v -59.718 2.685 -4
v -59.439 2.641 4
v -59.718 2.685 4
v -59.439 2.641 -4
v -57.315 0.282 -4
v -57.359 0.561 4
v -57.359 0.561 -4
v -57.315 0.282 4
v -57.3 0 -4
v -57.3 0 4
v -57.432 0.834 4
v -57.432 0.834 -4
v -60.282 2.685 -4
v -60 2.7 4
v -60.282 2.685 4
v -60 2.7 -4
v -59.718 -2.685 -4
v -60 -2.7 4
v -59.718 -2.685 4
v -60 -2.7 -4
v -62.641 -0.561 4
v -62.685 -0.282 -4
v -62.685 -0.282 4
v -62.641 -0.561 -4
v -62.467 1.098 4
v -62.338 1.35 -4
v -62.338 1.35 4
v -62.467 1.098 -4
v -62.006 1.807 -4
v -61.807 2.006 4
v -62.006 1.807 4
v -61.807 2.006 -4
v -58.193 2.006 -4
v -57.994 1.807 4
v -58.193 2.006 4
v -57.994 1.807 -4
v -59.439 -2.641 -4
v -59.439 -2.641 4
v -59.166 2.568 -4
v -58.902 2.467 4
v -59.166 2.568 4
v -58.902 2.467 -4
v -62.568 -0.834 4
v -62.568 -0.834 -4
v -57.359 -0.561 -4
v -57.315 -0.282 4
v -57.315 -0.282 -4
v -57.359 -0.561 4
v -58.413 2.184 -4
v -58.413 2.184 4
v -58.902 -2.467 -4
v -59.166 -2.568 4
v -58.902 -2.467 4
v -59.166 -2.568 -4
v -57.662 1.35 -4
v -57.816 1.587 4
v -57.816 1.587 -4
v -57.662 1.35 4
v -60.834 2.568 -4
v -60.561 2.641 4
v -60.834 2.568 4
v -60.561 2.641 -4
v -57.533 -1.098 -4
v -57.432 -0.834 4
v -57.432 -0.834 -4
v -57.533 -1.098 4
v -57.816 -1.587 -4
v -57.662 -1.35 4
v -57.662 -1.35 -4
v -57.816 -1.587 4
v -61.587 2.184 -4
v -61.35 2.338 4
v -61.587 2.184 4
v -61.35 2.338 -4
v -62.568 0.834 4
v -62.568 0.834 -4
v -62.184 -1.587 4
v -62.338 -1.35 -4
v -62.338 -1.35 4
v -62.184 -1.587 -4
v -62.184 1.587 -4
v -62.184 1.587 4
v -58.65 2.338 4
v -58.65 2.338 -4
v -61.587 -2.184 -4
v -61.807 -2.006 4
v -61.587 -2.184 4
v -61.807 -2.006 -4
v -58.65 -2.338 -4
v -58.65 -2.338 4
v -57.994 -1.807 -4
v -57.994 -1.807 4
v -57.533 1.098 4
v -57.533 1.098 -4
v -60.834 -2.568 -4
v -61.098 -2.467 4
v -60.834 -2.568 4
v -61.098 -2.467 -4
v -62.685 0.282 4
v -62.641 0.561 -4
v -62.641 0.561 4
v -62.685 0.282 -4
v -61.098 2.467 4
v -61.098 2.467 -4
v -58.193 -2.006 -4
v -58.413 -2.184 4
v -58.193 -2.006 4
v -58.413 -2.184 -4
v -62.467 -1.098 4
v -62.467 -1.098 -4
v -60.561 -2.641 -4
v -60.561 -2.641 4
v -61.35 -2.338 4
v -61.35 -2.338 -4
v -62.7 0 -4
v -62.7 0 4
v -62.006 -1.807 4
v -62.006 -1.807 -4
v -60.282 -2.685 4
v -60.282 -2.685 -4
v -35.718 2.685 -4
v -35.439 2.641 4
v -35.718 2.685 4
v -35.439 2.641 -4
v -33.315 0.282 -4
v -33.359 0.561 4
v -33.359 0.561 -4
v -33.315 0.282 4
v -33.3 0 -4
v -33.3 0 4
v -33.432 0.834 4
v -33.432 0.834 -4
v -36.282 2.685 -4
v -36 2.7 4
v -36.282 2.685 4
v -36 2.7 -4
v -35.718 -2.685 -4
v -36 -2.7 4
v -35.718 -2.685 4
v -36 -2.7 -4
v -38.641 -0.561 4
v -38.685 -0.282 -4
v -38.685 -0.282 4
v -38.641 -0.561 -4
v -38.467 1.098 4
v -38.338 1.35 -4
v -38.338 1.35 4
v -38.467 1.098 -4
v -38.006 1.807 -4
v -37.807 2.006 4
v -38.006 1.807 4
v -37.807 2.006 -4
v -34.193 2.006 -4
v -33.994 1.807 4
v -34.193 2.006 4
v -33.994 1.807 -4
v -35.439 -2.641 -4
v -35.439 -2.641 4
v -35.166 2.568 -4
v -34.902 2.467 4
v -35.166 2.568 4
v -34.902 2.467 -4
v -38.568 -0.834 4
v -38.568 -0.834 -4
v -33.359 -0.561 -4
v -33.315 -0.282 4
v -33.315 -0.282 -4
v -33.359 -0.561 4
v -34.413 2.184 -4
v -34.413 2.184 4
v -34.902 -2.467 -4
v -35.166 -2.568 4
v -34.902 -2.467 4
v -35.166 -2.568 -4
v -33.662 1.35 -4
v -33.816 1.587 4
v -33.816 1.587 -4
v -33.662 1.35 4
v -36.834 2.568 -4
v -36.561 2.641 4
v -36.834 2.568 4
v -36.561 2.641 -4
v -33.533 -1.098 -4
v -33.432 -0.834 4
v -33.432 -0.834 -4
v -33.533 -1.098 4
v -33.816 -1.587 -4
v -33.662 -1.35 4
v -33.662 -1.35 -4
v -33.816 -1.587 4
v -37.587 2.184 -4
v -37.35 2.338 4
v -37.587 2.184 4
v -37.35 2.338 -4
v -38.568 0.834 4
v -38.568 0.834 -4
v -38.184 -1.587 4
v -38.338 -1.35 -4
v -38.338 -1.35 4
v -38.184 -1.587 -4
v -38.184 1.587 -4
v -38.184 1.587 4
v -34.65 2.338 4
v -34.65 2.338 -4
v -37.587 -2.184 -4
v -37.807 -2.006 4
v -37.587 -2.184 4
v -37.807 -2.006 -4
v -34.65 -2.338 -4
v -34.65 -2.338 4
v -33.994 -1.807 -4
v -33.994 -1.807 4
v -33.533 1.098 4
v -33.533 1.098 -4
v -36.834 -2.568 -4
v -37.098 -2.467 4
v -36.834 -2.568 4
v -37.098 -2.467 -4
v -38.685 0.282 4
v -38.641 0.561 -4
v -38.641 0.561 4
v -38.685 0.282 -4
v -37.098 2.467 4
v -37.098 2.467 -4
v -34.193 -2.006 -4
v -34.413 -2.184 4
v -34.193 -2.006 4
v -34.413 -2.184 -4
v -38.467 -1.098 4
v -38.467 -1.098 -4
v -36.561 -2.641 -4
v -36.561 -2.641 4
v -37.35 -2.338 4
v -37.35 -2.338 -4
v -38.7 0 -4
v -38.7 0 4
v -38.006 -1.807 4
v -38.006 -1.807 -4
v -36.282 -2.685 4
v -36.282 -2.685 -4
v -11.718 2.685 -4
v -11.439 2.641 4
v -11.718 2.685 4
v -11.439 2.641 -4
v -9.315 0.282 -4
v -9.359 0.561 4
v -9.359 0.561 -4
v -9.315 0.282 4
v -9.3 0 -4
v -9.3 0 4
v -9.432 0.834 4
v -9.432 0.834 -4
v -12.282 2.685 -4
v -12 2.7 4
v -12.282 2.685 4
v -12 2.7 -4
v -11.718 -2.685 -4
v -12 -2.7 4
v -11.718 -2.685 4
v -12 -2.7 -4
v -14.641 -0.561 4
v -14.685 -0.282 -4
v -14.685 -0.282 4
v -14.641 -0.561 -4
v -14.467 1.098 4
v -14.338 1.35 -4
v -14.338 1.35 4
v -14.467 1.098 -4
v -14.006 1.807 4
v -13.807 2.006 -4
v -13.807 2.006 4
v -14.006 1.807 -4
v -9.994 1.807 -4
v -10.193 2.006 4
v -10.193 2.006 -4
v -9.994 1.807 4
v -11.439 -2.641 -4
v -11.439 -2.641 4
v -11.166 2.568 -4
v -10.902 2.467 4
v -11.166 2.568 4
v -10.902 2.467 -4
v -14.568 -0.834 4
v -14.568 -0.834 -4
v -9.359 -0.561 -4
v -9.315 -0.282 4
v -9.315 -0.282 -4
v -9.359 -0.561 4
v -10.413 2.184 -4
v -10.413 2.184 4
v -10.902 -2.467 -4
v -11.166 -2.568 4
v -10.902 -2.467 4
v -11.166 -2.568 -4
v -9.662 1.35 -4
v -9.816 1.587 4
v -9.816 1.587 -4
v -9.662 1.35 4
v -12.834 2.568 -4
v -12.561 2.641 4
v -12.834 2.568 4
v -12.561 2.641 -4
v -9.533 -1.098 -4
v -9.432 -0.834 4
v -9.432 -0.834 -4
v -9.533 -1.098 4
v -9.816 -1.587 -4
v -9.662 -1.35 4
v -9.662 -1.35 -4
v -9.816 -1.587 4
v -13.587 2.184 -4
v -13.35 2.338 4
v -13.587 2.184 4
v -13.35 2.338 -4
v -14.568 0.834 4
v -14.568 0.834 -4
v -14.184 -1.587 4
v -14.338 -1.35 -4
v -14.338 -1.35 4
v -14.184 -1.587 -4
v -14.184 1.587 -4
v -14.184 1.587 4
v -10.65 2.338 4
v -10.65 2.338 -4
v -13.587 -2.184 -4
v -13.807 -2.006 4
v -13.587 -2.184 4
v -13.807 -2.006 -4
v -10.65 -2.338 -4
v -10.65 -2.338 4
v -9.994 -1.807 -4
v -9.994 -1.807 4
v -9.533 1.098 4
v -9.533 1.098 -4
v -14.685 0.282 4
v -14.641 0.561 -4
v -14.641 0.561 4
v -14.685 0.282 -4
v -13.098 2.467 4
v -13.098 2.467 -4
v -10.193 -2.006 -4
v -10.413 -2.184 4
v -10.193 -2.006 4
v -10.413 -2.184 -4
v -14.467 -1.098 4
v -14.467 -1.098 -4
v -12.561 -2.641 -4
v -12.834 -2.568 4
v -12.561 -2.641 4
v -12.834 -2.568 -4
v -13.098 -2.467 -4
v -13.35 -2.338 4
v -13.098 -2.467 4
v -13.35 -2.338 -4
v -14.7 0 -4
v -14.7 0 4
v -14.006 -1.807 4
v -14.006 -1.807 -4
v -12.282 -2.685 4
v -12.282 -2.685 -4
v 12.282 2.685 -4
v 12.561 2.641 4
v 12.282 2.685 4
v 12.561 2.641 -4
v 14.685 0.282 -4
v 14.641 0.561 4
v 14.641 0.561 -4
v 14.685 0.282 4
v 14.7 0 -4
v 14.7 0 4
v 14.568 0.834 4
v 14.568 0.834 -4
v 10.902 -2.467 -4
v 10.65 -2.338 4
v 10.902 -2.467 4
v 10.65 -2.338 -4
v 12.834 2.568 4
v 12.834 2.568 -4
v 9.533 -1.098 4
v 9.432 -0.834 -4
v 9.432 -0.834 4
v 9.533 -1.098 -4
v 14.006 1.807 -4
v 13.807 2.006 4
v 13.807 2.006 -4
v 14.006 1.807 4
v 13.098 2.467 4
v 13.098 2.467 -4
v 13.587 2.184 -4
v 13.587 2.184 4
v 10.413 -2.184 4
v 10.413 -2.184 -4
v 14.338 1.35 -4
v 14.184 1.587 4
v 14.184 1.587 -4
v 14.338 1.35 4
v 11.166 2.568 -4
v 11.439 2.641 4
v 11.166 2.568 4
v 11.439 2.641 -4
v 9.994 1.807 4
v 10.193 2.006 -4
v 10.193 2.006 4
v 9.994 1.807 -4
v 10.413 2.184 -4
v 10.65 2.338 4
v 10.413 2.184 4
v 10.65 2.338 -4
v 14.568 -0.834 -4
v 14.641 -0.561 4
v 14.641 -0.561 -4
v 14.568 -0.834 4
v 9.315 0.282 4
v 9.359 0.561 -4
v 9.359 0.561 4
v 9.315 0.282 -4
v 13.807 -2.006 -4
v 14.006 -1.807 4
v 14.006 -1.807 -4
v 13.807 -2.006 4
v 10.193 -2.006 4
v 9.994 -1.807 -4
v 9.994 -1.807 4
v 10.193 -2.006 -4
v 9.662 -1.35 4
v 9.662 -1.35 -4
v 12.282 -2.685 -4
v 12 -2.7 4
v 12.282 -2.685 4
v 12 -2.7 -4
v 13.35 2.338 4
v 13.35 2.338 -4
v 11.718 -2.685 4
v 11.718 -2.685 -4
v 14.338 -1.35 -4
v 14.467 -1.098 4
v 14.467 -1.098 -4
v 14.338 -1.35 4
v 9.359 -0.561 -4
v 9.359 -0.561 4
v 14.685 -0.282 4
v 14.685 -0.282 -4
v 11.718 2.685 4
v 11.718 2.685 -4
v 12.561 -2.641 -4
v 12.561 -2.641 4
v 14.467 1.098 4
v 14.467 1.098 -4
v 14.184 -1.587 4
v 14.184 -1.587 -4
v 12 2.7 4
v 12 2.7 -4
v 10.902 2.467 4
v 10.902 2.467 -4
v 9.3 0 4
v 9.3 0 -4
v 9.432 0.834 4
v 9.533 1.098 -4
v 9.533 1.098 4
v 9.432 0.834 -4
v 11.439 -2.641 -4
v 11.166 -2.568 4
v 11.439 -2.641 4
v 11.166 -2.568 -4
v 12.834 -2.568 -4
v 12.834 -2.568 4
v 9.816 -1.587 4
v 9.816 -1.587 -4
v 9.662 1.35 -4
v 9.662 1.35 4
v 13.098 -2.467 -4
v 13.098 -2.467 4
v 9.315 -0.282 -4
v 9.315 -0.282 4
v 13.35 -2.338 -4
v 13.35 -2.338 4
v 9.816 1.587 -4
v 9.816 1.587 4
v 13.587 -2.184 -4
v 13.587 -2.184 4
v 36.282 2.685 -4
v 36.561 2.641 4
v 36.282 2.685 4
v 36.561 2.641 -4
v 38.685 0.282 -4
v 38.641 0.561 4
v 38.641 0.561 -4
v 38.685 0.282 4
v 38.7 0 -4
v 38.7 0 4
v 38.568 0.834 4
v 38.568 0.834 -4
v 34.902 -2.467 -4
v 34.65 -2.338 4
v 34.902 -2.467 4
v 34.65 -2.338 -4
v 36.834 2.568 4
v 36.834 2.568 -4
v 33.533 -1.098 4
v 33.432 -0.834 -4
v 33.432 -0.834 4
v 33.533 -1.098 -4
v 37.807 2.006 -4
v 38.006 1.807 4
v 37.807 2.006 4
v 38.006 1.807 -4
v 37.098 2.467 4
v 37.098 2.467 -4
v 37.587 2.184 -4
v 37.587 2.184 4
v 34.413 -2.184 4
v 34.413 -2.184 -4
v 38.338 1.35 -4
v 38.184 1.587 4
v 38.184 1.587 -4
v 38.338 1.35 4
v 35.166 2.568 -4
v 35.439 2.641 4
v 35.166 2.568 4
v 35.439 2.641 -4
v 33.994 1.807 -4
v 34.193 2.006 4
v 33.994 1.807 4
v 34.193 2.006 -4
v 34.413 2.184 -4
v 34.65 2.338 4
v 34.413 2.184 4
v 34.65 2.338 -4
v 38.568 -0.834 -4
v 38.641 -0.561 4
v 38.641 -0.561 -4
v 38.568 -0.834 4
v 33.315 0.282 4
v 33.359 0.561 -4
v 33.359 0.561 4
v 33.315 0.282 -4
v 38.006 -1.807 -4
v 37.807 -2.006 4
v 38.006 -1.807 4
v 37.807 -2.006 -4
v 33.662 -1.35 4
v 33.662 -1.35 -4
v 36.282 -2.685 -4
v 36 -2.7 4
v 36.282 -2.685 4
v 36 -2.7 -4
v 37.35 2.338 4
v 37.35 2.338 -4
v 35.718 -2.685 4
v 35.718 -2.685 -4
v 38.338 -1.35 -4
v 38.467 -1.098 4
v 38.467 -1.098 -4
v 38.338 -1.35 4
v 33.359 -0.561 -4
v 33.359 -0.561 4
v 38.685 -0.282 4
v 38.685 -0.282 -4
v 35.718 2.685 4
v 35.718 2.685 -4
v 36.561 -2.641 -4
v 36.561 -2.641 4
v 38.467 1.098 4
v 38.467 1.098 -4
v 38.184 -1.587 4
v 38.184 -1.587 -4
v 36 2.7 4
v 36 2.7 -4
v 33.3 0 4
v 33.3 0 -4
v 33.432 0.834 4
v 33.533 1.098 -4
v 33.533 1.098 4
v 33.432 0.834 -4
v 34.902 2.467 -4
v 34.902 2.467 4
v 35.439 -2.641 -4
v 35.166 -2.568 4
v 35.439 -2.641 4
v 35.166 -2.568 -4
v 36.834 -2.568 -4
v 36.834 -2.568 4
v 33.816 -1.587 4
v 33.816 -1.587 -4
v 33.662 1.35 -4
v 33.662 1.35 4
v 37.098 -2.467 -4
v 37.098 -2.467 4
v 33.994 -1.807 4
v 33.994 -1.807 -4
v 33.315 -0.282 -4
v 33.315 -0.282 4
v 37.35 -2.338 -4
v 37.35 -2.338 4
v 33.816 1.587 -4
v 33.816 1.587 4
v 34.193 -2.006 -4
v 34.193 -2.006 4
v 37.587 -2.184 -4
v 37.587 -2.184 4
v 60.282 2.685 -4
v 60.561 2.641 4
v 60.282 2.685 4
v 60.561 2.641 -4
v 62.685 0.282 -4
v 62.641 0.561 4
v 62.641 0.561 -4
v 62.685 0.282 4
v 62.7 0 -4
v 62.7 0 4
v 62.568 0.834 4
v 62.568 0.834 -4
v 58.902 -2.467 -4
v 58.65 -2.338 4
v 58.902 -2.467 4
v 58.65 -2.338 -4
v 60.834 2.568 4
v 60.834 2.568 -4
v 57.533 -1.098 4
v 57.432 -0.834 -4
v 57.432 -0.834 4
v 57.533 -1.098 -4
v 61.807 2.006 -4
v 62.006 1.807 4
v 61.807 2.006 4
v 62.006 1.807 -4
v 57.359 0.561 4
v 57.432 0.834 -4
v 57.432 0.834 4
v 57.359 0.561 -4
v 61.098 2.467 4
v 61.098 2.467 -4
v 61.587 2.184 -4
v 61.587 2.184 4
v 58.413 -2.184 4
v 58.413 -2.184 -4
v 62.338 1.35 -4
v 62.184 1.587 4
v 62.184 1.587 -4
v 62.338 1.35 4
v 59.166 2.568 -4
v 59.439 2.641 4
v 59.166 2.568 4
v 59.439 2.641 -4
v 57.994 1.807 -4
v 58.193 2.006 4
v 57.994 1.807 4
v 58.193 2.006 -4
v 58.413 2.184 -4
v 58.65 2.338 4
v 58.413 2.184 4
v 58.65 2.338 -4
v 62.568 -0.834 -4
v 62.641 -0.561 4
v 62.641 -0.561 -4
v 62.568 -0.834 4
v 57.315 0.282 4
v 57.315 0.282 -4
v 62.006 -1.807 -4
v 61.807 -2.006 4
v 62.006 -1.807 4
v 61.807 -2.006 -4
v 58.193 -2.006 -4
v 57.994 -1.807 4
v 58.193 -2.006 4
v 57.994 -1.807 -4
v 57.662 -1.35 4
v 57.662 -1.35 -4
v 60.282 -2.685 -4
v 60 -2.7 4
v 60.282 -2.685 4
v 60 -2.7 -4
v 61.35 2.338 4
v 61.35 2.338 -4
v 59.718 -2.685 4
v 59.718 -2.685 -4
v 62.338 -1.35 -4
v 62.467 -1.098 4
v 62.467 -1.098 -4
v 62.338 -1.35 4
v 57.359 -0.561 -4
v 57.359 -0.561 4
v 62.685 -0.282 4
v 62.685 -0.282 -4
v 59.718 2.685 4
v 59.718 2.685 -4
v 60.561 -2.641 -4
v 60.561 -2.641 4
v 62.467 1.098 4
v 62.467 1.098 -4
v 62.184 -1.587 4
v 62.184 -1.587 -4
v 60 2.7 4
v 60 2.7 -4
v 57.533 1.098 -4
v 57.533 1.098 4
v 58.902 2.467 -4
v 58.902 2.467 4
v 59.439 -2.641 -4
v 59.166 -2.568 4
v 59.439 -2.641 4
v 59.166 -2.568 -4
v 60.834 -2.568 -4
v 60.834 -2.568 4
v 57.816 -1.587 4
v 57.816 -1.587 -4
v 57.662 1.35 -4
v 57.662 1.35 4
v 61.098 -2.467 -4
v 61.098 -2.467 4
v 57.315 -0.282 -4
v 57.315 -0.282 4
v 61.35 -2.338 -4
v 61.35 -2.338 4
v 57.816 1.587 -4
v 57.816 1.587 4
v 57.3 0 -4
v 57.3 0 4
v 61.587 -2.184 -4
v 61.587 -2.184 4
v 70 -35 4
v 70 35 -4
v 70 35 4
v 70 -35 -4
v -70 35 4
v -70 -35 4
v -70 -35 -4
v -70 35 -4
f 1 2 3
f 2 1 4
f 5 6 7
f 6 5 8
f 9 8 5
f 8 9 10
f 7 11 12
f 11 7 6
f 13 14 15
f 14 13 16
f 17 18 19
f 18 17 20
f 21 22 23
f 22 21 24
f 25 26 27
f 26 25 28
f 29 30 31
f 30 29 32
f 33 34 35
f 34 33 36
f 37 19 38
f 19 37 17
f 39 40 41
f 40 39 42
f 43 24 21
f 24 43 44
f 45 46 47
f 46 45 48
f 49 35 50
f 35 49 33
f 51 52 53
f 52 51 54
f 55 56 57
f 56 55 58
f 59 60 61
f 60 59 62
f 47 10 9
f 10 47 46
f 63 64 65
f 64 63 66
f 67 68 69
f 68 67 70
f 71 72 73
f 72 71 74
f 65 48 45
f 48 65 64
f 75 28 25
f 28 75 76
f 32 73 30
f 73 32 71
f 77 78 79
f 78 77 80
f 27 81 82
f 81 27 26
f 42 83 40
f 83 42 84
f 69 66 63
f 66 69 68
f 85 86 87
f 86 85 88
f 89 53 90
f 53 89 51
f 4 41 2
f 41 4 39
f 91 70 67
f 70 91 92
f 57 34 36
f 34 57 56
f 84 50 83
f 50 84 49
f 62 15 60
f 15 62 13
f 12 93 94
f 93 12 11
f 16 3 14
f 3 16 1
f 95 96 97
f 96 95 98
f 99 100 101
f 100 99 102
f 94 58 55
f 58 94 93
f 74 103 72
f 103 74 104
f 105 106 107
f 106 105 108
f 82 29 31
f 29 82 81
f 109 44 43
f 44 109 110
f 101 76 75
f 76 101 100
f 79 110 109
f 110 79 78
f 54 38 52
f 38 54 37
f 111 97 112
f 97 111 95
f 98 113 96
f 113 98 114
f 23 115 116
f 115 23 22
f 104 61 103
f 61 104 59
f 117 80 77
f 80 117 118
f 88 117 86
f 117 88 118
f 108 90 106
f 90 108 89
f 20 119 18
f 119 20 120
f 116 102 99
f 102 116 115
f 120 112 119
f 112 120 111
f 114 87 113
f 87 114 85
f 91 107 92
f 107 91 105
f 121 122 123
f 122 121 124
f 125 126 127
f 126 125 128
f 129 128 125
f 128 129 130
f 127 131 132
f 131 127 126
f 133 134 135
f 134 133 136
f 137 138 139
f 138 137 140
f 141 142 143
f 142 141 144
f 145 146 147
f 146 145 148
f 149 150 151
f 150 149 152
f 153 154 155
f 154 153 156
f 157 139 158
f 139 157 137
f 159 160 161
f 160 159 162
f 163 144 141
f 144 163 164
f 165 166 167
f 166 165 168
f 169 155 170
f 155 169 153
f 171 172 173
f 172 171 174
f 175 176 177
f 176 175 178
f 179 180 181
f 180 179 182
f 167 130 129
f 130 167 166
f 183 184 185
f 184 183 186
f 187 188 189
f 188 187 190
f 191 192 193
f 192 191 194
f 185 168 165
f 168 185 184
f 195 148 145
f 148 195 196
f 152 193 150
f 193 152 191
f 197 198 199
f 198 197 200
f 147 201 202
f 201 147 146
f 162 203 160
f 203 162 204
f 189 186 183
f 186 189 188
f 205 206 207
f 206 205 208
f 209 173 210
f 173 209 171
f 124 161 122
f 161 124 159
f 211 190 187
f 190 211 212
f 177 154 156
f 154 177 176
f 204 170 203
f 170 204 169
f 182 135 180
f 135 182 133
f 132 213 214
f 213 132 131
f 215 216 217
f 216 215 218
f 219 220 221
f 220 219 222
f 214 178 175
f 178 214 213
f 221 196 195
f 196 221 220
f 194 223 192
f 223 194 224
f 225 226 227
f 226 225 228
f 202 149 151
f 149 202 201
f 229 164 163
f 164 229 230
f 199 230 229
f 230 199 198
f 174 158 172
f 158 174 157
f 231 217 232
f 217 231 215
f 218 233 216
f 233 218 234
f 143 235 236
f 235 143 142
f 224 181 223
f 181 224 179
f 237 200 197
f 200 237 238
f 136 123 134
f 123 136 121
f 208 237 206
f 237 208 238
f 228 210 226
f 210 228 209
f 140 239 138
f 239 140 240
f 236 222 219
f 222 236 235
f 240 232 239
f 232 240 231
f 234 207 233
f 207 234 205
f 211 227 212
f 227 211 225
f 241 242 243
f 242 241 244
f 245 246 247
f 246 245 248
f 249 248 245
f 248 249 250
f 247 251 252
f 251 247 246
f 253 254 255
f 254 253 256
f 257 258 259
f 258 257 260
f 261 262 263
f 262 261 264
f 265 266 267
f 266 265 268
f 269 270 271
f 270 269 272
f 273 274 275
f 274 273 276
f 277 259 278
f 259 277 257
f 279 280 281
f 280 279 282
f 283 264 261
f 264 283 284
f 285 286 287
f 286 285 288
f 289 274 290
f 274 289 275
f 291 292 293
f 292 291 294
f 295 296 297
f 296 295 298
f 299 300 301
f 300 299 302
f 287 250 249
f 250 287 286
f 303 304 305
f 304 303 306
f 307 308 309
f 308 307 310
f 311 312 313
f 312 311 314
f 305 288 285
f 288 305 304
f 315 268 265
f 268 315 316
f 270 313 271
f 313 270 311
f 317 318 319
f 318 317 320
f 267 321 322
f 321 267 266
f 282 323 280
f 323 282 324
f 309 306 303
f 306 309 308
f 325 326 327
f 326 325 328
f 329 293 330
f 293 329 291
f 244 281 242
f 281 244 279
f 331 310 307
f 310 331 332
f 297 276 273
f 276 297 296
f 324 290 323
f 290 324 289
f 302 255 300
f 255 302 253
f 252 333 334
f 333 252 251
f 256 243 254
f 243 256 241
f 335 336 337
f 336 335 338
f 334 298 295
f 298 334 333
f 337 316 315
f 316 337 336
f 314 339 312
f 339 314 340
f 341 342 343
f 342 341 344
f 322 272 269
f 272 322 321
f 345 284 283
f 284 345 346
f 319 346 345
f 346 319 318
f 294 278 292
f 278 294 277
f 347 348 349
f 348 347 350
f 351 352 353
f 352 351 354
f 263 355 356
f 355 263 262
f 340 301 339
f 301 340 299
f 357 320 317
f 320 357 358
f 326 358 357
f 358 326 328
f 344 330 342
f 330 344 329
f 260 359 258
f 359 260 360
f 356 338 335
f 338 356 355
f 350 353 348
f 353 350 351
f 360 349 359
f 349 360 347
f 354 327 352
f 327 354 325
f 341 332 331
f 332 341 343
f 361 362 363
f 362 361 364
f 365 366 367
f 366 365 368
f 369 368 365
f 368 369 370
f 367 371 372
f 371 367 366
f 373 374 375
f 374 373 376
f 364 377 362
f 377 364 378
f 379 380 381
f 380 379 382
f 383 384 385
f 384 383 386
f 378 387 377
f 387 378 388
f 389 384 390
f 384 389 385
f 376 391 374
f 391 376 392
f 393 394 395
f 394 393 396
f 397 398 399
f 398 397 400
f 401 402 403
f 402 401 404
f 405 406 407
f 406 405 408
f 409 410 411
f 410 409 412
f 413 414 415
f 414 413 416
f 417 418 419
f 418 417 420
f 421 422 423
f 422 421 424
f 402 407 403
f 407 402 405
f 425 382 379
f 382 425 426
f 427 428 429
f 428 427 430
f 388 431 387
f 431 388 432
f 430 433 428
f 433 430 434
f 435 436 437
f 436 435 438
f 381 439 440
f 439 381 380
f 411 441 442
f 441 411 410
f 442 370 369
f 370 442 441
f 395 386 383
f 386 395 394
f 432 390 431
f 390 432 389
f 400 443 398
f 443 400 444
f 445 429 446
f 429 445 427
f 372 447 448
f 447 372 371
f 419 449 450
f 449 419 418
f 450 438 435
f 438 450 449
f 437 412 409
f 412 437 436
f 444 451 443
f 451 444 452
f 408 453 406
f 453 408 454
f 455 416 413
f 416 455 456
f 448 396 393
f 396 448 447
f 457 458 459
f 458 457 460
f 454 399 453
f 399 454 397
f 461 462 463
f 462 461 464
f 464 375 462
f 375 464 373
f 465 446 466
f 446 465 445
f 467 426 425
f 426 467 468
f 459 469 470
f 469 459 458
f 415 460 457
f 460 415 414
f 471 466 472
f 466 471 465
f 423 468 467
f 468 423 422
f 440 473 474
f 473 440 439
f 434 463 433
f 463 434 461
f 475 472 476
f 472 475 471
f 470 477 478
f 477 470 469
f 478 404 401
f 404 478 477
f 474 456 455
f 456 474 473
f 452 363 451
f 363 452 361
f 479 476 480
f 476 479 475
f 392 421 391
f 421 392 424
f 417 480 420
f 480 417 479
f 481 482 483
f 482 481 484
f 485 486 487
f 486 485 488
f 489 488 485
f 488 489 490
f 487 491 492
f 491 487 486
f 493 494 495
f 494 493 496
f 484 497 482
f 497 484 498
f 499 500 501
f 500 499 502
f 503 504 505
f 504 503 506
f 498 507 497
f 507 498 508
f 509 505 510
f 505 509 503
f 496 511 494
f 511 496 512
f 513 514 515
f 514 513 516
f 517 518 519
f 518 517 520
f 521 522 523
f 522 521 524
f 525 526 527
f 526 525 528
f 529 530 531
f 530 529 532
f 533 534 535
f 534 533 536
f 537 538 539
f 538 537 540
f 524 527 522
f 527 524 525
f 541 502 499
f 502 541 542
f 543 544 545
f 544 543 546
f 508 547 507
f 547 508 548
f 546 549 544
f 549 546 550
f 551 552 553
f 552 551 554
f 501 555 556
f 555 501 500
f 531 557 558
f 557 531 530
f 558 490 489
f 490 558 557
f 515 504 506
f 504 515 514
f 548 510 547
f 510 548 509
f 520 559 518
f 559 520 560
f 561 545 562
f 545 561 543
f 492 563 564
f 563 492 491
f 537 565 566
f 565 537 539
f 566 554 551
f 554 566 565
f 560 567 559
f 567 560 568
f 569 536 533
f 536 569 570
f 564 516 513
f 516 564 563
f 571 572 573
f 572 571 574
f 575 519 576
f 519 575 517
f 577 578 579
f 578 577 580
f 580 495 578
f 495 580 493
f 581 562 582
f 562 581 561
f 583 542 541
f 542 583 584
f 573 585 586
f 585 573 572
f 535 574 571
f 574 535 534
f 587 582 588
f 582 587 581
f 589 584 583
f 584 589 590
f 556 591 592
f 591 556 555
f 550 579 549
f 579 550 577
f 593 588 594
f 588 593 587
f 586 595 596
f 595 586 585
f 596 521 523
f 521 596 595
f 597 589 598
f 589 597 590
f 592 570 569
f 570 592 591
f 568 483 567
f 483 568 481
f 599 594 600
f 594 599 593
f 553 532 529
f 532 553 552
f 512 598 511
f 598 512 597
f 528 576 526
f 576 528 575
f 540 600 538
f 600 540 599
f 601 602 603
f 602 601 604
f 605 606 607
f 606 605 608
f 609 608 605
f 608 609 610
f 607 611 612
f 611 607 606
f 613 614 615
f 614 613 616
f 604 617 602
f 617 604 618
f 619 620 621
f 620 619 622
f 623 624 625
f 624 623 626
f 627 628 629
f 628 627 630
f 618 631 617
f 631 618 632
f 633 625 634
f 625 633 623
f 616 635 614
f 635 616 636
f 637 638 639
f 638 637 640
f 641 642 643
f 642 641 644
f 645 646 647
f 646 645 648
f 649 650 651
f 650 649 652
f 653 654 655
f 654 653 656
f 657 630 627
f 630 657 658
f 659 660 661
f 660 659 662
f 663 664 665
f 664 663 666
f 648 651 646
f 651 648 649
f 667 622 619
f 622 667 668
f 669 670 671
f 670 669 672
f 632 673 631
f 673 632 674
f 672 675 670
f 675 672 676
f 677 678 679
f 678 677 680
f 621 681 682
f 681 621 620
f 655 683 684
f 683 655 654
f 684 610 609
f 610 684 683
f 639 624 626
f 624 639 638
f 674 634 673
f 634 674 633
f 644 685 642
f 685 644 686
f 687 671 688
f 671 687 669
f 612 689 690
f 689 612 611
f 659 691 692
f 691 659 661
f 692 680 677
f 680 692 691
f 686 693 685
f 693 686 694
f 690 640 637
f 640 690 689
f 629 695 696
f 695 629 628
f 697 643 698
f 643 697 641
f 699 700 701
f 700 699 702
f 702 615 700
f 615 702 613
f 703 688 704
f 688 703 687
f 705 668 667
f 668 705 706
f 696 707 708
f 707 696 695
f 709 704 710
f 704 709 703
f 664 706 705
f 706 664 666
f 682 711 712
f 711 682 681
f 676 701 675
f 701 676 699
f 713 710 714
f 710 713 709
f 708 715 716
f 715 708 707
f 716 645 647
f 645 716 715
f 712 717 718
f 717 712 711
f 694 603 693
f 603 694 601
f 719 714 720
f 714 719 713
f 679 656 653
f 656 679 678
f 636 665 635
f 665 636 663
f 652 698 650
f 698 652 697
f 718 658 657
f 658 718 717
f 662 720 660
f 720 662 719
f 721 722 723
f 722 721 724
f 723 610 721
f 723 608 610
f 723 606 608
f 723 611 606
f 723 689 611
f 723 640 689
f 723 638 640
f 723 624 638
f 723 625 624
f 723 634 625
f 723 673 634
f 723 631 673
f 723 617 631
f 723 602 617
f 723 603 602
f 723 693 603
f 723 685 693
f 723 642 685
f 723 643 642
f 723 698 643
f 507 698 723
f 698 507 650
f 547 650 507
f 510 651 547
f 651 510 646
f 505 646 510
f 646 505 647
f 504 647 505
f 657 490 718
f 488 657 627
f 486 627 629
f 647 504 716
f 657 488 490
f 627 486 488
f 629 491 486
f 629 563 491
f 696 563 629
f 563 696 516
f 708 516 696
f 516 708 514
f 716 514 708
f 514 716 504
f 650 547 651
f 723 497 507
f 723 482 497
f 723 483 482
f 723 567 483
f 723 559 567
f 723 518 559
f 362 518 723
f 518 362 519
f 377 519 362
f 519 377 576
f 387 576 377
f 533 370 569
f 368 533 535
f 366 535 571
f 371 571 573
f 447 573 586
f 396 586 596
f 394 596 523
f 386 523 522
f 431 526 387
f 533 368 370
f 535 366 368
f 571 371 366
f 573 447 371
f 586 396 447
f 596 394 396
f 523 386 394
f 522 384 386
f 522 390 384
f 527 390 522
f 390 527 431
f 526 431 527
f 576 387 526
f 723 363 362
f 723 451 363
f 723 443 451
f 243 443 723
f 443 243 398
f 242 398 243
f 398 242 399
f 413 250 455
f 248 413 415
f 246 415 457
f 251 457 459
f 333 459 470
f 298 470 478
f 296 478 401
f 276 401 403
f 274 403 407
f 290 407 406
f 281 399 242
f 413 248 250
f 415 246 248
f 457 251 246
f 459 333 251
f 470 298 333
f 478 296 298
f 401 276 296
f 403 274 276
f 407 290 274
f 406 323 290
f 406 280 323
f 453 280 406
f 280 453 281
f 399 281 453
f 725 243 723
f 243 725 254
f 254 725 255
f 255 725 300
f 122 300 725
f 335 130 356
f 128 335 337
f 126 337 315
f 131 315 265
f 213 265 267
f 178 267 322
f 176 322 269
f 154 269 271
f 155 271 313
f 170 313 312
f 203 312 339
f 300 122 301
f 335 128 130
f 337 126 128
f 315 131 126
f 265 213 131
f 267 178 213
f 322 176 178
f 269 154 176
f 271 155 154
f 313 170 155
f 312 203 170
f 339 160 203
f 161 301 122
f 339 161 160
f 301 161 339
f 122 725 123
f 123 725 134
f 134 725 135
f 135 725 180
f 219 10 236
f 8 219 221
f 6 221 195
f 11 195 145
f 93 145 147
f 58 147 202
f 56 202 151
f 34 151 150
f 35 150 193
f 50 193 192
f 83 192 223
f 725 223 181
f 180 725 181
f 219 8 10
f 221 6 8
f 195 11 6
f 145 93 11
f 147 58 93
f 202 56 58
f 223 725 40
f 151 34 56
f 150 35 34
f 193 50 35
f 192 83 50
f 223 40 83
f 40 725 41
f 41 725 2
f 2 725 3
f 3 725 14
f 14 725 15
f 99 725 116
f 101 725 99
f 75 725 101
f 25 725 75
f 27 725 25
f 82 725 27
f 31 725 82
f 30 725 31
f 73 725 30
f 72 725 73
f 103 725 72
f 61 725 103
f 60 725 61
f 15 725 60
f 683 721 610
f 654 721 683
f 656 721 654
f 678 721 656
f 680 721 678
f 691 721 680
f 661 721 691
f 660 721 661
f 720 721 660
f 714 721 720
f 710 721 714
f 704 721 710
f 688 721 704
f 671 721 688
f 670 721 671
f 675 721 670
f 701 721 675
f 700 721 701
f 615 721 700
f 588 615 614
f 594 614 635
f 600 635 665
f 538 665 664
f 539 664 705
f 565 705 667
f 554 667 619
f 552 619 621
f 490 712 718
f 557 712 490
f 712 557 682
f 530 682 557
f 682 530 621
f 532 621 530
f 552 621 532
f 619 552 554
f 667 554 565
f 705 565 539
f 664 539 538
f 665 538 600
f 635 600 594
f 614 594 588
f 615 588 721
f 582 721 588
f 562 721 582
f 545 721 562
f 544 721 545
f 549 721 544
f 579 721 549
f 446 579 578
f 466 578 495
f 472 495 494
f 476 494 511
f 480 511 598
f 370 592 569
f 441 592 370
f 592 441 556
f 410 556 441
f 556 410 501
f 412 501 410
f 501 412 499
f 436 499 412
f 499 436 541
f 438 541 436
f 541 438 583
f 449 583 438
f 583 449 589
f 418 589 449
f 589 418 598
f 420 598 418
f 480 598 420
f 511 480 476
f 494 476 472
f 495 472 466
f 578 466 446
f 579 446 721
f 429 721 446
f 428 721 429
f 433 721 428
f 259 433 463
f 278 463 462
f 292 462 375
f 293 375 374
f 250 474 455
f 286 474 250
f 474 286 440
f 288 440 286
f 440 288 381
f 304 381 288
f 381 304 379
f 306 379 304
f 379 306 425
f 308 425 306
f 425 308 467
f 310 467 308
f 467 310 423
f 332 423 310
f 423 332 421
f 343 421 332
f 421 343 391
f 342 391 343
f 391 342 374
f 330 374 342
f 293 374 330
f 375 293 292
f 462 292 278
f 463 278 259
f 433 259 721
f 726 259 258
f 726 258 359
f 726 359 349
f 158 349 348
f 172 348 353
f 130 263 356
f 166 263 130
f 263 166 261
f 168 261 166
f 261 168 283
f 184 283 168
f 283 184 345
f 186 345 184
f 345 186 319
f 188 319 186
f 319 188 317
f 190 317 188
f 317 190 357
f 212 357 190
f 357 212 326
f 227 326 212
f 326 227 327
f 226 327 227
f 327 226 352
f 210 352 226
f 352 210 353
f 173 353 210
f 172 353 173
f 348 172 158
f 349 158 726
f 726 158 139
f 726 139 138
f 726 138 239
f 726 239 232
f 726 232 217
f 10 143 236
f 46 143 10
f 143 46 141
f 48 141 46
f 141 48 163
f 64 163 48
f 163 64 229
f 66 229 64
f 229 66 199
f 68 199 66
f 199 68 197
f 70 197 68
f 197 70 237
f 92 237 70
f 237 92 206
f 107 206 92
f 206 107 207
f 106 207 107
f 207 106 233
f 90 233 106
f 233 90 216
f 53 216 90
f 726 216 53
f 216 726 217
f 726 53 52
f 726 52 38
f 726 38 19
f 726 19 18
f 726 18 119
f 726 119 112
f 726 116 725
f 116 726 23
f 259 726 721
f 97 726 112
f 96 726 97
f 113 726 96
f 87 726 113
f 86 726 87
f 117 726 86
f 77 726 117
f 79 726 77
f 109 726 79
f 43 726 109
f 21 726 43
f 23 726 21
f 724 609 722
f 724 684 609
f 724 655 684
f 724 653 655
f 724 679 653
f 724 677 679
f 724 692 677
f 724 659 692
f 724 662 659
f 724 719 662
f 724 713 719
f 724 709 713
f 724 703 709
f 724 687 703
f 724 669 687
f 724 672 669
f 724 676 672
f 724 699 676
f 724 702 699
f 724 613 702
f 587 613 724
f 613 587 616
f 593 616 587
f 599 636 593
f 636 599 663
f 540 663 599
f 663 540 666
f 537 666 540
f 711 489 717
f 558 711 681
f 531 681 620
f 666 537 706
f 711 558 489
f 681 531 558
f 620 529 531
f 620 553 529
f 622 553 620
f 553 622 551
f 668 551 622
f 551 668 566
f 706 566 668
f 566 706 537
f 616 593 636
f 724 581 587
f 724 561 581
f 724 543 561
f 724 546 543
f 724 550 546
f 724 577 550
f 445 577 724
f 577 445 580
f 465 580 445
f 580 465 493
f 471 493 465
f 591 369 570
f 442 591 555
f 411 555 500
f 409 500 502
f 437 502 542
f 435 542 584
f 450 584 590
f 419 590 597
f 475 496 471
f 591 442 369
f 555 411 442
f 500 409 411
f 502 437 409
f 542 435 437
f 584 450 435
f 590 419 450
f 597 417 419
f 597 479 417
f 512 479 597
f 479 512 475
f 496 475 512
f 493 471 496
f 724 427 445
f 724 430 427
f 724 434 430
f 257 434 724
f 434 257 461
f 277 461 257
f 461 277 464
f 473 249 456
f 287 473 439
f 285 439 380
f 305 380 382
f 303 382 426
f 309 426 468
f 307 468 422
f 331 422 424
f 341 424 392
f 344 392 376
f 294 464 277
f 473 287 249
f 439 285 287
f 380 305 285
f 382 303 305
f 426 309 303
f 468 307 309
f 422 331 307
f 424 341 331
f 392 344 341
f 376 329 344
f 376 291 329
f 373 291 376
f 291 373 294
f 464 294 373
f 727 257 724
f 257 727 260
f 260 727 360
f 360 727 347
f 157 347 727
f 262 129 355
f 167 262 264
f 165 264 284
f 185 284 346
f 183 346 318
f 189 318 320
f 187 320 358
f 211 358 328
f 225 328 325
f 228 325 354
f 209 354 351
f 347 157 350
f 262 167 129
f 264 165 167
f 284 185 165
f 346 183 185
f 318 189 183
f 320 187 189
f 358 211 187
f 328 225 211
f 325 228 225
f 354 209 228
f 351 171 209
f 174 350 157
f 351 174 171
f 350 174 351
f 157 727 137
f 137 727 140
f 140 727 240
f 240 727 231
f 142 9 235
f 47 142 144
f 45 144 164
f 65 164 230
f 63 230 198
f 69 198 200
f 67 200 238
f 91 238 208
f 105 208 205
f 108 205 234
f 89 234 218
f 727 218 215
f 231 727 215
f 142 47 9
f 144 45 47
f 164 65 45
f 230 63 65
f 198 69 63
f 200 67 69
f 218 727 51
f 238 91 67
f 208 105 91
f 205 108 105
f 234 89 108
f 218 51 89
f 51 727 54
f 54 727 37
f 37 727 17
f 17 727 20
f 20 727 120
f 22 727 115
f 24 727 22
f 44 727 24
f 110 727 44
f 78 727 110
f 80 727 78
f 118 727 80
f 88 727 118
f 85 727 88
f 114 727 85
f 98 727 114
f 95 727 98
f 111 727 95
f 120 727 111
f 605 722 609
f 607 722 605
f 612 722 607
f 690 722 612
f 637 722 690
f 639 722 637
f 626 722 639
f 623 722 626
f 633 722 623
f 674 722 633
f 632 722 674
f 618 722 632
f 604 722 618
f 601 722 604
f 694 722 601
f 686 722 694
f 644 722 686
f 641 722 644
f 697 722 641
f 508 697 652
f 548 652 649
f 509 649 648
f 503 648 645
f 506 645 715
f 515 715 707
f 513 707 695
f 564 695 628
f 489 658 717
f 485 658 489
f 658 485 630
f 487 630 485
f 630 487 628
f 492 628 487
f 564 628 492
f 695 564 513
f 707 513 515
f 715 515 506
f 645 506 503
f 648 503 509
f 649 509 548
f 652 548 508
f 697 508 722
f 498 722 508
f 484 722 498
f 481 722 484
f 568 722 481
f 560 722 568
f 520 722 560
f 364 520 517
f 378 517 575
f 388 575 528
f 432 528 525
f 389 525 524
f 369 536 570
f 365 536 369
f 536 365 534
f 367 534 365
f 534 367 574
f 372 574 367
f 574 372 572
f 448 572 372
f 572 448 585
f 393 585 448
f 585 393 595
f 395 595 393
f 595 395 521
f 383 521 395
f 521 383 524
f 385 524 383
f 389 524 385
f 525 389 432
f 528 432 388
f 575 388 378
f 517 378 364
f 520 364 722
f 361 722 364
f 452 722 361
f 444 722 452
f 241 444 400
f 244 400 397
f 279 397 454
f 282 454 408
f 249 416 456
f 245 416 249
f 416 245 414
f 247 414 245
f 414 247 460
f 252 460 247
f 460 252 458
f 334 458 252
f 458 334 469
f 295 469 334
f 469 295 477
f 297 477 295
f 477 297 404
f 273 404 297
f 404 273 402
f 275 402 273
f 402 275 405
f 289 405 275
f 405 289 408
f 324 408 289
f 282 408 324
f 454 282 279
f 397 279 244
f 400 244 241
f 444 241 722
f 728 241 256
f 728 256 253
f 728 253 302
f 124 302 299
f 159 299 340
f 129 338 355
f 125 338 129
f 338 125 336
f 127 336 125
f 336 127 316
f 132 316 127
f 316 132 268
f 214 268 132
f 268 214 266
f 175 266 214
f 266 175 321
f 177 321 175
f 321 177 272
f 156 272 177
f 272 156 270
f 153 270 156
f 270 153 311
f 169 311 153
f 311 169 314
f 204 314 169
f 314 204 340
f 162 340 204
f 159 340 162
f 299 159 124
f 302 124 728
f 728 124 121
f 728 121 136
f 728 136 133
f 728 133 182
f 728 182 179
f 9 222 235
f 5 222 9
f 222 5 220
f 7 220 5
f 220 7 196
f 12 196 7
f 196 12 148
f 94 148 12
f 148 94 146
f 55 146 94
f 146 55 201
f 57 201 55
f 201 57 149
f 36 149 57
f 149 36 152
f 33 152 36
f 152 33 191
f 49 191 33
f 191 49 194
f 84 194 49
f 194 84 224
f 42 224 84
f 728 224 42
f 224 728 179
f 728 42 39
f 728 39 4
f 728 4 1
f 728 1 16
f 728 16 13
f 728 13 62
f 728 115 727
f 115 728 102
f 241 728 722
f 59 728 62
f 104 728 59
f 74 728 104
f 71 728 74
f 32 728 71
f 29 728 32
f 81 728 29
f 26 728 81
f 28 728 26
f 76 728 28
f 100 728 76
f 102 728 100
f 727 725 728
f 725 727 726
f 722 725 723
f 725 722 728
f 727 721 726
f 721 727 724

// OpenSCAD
// Multi-hole mounting plate.
$fn = 60;
eps = 0.02;
plate_l = 140;
plate_w = 70;
plate_t = 8;
hole_d = 5.4;
edge = 10;
difference() {
    cube([plate_l, plate_w, plate_t], center = true);
    for (i = [0 : 5])
        translate([-plate_l / 2 + edge + i * (plate_l - 2 * edge) / max(1, 5), 0, -plate_t / 2 - eps])
            cylinder(d = hole_d, h = plate_t + 2 * eps);
}
